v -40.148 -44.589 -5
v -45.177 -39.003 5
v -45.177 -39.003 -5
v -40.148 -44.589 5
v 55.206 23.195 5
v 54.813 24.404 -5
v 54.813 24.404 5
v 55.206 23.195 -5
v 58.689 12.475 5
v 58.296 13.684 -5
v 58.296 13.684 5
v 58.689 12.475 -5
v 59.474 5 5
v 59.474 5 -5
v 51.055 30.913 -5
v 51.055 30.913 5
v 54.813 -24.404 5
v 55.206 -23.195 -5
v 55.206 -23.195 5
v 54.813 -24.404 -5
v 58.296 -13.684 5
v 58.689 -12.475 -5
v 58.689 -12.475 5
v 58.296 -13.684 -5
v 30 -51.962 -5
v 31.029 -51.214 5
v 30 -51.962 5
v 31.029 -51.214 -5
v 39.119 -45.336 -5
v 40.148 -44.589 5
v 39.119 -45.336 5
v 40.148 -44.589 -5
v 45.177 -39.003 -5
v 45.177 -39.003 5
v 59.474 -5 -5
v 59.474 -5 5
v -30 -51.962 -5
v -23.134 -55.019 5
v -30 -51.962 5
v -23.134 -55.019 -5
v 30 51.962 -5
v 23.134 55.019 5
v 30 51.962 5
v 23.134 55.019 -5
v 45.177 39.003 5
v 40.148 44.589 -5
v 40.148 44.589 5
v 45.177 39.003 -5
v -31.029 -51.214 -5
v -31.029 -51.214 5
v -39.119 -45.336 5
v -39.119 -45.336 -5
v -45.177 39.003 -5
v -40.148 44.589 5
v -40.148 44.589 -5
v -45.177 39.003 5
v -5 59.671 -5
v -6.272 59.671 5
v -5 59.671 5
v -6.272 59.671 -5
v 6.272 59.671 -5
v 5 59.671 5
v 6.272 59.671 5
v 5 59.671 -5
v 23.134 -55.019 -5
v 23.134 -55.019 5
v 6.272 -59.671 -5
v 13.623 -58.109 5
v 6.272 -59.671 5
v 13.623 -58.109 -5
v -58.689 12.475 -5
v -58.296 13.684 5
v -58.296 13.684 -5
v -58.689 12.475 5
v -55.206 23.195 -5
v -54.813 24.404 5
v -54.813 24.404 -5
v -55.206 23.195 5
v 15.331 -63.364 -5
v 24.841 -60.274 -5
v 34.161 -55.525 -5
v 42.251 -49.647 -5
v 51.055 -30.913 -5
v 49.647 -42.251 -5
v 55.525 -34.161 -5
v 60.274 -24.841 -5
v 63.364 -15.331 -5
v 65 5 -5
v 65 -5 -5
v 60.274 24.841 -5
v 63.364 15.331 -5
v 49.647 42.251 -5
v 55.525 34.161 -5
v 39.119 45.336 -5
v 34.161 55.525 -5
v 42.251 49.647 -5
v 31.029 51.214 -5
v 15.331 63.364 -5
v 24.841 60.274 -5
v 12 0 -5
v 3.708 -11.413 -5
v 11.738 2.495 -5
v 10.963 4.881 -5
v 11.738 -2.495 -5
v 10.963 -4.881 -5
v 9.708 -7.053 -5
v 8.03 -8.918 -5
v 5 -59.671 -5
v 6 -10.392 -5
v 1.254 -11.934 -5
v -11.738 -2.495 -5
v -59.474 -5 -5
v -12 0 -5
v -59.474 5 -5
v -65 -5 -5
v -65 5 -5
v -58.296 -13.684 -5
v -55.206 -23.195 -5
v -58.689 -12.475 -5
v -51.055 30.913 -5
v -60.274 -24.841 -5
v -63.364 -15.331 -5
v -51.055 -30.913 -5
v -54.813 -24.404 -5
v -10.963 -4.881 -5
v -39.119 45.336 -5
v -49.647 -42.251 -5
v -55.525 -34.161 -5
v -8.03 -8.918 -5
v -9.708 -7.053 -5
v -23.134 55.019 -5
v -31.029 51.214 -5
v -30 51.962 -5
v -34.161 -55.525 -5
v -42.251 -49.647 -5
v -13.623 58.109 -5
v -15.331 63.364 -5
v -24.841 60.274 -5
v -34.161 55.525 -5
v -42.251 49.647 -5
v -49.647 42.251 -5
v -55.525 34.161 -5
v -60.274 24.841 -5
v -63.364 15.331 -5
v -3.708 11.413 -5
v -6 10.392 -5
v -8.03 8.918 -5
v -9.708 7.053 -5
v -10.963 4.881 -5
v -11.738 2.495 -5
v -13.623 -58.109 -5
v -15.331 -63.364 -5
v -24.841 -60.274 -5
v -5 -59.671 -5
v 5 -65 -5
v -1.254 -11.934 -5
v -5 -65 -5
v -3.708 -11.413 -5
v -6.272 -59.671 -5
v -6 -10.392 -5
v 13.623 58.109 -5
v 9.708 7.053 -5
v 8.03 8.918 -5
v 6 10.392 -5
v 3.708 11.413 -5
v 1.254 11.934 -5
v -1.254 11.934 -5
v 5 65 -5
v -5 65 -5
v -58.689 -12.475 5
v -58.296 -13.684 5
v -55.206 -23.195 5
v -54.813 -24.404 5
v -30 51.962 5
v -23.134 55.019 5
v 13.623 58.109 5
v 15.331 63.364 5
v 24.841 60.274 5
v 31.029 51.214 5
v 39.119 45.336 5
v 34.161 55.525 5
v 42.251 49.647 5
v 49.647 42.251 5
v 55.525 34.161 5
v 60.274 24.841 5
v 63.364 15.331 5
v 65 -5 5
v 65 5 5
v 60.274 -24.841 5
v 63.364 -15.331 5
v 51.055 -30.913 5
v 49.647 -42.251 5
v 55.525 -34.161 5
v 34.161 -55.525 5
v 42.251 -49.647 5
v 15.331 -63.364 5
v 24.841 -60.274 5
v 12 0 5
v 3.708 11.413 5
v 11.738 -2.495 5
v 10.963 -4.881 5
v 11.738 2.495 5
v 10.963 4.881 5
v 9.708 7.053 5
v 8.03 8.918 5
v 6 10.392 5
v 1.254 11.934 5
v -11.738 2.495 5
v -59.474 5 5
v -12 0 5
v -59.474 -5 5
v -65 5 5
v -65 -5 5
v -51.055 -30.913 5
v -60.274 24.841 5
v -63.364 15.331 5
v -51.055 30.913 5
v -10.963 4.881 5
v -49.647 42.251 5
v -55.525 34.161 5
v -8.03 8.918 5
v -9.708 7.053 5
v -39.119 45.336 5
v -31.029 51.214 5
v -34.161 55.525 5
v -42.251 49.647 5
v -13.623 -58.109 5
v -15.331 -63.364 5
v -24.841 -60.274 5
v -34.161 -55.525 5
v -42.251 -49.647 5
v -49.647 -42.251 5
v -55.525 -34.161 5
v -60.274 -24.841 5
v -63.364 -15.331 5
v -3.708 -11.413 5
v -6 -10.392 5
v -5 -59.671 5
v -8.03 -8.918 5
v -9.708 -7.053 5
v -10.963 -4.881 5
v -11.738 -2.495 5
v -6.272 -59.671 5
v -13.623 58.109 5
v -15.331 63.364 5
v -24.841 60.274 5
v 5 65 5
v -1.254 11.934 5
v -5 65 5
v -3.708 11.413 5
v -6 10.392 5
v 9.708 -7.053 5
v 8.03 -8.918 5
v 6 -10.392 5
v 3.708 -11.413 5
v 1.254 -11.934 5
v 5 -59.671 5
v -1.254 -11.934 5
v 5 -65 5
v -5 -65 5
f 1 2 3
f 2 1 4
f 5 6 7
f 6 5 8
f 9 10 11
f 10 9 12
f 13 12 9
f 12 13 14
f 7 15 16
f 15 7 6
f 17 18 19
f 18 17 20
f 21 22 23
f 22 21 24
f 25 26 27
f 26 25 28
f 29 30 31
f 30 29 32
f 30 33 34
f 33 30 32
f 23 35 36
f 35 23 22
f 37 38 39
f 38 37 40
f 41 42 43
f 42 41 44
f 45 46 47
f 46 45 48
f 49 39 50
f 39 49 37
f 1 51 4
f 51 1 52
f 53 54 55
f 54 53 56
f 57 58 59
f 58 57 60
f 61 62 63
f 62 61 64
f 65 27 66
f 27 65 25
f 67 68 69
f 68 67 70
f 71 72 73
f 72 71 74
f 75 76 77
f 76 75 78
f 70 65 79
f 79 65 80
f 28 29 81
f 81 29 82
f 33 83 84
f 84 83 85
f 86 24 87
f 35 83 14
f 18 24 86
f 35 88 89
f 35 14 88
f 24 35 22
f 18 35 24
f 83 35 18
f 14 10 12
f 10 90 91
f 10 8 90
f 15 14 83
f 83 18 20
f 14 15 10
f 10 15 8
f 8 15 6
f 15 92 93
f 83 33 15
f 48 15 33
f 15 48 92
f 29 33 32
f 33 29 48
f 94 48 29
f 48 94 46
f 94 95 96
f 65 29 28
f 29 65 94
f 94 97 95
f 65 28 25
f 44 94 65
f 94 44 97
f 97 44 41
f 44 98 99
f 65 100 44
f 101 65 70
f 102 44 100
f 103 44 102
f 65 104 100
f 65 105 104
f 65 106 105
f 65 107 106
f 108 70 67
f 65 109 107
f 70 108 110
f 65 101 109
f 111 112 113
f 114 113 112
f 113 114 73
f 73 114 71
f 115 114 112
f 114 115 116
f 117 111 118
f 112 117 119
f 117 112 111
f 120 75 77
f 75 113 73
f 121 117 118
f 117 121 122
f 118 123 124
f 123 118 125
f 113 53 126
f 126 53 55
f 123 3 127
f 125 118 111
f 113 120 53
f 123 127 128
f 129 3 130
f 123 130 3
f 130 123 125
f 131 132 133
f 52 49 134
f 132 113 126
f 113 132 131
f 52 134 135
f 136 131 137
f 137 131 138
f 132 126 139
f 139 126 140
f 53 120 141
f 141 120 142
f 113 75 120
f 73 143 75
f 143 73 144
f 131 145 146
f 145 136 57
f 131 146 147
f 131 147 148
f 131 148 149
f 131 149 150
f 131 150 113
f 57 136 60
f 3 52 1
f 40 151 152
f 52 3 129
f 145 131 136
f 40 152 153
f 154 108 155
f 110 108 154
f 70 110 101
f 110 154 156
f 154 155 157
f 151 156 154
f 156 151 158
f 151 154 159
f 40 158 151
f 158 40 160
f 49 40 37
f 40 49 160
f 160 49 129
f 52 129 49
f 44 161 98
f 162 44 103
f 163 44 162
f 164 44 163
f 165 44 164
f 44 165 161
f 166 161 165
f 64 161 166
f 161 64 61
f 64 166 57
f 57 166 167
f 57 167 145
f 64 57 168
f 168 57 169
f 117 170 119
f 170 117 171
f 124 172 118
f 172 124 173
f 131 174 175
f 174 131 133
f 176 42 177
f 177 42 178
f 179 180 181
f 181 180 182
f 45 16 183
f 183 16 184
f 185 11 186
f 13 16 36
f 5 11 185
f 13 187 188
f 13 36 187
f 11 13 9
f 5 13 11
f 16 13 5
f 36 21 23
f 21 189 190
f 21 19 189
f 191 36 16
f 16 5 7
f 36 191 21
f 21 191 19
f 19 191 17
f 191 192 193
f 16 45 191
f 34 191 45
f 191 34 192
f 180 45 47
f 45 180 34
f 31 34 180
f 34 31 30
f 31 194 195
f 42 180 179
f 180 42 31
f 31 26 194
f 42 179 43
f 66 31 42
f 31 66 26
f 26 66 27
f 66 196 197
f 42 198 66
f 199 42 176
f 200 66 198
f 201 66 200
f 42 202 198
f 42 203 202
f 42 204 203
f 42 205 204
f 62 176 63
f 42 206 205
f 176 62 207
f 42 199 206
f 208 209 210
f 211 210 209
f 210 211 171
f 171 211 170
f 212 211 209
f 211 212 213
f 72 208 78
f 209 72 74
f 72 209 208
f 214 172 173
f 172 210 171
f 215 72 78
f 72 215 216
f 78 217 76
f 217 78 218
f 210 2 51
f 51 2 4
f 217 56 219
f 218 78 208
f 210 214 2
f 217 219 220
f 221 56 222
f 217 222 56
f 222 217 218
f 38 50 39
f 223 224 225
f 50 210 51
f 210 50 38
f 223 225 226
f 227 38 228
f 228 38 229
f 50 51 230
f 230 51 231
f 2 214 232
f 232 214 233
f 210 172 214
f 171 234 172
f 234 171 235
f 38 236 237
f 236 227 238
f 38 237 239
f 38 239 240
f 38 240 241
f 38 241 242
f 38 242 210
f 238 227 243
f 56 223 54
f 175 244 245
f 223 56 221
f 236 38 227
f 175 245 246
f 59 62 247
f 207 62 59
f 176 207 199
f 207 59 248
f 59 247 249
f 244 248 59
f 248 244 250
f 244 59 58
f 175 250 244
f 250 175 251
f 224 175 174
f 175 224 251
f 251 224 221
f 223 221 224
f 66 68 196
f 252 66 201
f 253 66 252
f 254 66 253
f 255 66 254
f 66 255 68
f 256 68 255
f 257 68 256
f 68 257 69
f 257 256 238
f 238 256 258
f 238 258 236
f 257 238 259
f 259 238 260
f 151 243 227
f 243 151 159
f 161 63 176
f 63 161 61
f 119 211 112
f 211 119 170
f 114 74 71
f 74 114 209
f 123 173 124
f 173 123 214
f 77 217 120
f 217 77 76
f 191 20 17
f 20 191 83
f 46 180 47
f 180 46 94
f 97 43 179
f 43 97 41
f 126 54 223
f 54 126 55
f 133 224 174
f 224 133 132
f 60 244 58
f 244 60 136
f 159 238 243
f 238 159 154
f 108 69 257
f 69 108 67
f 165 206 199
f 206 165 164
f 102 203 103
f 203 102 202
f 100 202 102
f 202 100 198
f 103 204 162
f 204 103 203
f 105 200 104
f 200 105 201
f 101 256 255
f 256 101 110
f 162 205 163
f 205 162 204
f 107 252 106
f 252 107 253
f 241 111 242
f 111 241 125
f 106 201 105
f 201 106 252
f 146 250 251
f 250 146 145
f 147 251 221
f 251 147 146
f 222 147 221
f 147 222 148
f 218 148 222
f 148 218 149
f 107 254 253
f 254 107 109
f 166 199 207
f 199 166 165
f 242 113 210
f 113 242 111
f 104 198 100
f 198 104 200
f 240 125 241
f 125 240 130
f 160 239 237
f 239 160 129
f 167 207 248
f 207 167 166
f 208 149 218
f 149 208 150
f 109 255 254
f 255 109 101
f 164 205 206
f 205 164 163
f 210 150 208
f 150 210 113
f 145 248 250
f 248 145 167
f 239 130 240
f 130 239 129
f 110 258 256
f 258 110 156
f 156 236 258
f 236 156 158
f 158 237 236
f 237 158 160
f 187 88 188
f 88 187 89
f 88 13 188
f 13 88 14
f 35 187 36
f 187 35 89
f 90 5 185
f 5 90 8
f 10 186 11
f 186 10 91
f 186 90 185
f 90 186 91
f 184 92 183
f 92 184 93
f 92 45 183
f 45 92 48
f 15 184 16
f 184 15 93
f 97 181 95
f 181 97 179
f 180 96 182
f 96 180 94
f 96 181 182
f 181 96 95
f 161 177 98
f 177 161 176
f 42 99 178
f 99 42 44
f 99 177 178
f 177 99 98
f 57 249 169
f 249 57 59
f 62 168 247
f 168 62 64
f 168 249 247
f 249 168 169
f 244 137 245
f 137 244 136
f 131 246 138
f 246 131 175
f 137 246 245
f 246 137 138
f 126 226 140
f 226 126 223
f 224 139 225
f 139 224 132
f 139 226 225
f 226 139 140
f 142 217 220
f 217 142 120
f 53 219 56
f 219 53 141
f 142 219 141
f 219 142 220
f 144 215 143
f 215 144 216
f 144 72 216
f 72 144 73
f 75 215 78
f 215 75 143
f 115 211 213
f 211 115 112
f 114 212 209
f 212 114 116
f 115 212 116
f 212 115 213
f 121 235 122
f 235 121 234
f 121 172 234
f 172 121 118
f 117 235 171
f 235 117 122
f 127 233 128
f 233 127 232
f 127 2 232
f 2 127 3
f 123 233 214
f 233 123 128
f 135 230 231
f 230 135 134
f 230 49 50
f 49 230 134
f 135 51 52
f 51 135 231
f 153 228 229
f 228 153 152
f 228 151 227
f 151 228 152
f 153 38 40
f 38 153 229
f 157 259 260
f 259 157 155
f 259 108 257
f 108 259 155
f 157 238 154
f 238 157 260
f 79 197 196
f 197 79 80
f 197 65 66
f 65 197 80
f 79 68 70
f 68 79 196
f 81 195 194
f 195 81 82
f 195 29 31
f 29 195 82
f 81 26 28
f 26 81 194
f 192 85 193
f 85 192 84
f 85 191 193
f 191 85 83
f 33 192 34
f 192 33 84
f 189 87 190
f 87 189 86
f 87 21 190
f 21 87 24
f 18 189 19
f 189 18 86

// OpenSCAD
num_teeth = 20;
rad_gear = 60;

difference(){
    cylinder(h=10, r=rad_gear, center=true);
    cylinder(h=12, r=rad_gear/5, center=true);
}

for(tooth = [0 : num_teeth]){
    rotate([0,0,tooth*360/num_teeth]){
        translate([rad_gear,0,0]){
            cube(10, center=true);
        }
    }
}
